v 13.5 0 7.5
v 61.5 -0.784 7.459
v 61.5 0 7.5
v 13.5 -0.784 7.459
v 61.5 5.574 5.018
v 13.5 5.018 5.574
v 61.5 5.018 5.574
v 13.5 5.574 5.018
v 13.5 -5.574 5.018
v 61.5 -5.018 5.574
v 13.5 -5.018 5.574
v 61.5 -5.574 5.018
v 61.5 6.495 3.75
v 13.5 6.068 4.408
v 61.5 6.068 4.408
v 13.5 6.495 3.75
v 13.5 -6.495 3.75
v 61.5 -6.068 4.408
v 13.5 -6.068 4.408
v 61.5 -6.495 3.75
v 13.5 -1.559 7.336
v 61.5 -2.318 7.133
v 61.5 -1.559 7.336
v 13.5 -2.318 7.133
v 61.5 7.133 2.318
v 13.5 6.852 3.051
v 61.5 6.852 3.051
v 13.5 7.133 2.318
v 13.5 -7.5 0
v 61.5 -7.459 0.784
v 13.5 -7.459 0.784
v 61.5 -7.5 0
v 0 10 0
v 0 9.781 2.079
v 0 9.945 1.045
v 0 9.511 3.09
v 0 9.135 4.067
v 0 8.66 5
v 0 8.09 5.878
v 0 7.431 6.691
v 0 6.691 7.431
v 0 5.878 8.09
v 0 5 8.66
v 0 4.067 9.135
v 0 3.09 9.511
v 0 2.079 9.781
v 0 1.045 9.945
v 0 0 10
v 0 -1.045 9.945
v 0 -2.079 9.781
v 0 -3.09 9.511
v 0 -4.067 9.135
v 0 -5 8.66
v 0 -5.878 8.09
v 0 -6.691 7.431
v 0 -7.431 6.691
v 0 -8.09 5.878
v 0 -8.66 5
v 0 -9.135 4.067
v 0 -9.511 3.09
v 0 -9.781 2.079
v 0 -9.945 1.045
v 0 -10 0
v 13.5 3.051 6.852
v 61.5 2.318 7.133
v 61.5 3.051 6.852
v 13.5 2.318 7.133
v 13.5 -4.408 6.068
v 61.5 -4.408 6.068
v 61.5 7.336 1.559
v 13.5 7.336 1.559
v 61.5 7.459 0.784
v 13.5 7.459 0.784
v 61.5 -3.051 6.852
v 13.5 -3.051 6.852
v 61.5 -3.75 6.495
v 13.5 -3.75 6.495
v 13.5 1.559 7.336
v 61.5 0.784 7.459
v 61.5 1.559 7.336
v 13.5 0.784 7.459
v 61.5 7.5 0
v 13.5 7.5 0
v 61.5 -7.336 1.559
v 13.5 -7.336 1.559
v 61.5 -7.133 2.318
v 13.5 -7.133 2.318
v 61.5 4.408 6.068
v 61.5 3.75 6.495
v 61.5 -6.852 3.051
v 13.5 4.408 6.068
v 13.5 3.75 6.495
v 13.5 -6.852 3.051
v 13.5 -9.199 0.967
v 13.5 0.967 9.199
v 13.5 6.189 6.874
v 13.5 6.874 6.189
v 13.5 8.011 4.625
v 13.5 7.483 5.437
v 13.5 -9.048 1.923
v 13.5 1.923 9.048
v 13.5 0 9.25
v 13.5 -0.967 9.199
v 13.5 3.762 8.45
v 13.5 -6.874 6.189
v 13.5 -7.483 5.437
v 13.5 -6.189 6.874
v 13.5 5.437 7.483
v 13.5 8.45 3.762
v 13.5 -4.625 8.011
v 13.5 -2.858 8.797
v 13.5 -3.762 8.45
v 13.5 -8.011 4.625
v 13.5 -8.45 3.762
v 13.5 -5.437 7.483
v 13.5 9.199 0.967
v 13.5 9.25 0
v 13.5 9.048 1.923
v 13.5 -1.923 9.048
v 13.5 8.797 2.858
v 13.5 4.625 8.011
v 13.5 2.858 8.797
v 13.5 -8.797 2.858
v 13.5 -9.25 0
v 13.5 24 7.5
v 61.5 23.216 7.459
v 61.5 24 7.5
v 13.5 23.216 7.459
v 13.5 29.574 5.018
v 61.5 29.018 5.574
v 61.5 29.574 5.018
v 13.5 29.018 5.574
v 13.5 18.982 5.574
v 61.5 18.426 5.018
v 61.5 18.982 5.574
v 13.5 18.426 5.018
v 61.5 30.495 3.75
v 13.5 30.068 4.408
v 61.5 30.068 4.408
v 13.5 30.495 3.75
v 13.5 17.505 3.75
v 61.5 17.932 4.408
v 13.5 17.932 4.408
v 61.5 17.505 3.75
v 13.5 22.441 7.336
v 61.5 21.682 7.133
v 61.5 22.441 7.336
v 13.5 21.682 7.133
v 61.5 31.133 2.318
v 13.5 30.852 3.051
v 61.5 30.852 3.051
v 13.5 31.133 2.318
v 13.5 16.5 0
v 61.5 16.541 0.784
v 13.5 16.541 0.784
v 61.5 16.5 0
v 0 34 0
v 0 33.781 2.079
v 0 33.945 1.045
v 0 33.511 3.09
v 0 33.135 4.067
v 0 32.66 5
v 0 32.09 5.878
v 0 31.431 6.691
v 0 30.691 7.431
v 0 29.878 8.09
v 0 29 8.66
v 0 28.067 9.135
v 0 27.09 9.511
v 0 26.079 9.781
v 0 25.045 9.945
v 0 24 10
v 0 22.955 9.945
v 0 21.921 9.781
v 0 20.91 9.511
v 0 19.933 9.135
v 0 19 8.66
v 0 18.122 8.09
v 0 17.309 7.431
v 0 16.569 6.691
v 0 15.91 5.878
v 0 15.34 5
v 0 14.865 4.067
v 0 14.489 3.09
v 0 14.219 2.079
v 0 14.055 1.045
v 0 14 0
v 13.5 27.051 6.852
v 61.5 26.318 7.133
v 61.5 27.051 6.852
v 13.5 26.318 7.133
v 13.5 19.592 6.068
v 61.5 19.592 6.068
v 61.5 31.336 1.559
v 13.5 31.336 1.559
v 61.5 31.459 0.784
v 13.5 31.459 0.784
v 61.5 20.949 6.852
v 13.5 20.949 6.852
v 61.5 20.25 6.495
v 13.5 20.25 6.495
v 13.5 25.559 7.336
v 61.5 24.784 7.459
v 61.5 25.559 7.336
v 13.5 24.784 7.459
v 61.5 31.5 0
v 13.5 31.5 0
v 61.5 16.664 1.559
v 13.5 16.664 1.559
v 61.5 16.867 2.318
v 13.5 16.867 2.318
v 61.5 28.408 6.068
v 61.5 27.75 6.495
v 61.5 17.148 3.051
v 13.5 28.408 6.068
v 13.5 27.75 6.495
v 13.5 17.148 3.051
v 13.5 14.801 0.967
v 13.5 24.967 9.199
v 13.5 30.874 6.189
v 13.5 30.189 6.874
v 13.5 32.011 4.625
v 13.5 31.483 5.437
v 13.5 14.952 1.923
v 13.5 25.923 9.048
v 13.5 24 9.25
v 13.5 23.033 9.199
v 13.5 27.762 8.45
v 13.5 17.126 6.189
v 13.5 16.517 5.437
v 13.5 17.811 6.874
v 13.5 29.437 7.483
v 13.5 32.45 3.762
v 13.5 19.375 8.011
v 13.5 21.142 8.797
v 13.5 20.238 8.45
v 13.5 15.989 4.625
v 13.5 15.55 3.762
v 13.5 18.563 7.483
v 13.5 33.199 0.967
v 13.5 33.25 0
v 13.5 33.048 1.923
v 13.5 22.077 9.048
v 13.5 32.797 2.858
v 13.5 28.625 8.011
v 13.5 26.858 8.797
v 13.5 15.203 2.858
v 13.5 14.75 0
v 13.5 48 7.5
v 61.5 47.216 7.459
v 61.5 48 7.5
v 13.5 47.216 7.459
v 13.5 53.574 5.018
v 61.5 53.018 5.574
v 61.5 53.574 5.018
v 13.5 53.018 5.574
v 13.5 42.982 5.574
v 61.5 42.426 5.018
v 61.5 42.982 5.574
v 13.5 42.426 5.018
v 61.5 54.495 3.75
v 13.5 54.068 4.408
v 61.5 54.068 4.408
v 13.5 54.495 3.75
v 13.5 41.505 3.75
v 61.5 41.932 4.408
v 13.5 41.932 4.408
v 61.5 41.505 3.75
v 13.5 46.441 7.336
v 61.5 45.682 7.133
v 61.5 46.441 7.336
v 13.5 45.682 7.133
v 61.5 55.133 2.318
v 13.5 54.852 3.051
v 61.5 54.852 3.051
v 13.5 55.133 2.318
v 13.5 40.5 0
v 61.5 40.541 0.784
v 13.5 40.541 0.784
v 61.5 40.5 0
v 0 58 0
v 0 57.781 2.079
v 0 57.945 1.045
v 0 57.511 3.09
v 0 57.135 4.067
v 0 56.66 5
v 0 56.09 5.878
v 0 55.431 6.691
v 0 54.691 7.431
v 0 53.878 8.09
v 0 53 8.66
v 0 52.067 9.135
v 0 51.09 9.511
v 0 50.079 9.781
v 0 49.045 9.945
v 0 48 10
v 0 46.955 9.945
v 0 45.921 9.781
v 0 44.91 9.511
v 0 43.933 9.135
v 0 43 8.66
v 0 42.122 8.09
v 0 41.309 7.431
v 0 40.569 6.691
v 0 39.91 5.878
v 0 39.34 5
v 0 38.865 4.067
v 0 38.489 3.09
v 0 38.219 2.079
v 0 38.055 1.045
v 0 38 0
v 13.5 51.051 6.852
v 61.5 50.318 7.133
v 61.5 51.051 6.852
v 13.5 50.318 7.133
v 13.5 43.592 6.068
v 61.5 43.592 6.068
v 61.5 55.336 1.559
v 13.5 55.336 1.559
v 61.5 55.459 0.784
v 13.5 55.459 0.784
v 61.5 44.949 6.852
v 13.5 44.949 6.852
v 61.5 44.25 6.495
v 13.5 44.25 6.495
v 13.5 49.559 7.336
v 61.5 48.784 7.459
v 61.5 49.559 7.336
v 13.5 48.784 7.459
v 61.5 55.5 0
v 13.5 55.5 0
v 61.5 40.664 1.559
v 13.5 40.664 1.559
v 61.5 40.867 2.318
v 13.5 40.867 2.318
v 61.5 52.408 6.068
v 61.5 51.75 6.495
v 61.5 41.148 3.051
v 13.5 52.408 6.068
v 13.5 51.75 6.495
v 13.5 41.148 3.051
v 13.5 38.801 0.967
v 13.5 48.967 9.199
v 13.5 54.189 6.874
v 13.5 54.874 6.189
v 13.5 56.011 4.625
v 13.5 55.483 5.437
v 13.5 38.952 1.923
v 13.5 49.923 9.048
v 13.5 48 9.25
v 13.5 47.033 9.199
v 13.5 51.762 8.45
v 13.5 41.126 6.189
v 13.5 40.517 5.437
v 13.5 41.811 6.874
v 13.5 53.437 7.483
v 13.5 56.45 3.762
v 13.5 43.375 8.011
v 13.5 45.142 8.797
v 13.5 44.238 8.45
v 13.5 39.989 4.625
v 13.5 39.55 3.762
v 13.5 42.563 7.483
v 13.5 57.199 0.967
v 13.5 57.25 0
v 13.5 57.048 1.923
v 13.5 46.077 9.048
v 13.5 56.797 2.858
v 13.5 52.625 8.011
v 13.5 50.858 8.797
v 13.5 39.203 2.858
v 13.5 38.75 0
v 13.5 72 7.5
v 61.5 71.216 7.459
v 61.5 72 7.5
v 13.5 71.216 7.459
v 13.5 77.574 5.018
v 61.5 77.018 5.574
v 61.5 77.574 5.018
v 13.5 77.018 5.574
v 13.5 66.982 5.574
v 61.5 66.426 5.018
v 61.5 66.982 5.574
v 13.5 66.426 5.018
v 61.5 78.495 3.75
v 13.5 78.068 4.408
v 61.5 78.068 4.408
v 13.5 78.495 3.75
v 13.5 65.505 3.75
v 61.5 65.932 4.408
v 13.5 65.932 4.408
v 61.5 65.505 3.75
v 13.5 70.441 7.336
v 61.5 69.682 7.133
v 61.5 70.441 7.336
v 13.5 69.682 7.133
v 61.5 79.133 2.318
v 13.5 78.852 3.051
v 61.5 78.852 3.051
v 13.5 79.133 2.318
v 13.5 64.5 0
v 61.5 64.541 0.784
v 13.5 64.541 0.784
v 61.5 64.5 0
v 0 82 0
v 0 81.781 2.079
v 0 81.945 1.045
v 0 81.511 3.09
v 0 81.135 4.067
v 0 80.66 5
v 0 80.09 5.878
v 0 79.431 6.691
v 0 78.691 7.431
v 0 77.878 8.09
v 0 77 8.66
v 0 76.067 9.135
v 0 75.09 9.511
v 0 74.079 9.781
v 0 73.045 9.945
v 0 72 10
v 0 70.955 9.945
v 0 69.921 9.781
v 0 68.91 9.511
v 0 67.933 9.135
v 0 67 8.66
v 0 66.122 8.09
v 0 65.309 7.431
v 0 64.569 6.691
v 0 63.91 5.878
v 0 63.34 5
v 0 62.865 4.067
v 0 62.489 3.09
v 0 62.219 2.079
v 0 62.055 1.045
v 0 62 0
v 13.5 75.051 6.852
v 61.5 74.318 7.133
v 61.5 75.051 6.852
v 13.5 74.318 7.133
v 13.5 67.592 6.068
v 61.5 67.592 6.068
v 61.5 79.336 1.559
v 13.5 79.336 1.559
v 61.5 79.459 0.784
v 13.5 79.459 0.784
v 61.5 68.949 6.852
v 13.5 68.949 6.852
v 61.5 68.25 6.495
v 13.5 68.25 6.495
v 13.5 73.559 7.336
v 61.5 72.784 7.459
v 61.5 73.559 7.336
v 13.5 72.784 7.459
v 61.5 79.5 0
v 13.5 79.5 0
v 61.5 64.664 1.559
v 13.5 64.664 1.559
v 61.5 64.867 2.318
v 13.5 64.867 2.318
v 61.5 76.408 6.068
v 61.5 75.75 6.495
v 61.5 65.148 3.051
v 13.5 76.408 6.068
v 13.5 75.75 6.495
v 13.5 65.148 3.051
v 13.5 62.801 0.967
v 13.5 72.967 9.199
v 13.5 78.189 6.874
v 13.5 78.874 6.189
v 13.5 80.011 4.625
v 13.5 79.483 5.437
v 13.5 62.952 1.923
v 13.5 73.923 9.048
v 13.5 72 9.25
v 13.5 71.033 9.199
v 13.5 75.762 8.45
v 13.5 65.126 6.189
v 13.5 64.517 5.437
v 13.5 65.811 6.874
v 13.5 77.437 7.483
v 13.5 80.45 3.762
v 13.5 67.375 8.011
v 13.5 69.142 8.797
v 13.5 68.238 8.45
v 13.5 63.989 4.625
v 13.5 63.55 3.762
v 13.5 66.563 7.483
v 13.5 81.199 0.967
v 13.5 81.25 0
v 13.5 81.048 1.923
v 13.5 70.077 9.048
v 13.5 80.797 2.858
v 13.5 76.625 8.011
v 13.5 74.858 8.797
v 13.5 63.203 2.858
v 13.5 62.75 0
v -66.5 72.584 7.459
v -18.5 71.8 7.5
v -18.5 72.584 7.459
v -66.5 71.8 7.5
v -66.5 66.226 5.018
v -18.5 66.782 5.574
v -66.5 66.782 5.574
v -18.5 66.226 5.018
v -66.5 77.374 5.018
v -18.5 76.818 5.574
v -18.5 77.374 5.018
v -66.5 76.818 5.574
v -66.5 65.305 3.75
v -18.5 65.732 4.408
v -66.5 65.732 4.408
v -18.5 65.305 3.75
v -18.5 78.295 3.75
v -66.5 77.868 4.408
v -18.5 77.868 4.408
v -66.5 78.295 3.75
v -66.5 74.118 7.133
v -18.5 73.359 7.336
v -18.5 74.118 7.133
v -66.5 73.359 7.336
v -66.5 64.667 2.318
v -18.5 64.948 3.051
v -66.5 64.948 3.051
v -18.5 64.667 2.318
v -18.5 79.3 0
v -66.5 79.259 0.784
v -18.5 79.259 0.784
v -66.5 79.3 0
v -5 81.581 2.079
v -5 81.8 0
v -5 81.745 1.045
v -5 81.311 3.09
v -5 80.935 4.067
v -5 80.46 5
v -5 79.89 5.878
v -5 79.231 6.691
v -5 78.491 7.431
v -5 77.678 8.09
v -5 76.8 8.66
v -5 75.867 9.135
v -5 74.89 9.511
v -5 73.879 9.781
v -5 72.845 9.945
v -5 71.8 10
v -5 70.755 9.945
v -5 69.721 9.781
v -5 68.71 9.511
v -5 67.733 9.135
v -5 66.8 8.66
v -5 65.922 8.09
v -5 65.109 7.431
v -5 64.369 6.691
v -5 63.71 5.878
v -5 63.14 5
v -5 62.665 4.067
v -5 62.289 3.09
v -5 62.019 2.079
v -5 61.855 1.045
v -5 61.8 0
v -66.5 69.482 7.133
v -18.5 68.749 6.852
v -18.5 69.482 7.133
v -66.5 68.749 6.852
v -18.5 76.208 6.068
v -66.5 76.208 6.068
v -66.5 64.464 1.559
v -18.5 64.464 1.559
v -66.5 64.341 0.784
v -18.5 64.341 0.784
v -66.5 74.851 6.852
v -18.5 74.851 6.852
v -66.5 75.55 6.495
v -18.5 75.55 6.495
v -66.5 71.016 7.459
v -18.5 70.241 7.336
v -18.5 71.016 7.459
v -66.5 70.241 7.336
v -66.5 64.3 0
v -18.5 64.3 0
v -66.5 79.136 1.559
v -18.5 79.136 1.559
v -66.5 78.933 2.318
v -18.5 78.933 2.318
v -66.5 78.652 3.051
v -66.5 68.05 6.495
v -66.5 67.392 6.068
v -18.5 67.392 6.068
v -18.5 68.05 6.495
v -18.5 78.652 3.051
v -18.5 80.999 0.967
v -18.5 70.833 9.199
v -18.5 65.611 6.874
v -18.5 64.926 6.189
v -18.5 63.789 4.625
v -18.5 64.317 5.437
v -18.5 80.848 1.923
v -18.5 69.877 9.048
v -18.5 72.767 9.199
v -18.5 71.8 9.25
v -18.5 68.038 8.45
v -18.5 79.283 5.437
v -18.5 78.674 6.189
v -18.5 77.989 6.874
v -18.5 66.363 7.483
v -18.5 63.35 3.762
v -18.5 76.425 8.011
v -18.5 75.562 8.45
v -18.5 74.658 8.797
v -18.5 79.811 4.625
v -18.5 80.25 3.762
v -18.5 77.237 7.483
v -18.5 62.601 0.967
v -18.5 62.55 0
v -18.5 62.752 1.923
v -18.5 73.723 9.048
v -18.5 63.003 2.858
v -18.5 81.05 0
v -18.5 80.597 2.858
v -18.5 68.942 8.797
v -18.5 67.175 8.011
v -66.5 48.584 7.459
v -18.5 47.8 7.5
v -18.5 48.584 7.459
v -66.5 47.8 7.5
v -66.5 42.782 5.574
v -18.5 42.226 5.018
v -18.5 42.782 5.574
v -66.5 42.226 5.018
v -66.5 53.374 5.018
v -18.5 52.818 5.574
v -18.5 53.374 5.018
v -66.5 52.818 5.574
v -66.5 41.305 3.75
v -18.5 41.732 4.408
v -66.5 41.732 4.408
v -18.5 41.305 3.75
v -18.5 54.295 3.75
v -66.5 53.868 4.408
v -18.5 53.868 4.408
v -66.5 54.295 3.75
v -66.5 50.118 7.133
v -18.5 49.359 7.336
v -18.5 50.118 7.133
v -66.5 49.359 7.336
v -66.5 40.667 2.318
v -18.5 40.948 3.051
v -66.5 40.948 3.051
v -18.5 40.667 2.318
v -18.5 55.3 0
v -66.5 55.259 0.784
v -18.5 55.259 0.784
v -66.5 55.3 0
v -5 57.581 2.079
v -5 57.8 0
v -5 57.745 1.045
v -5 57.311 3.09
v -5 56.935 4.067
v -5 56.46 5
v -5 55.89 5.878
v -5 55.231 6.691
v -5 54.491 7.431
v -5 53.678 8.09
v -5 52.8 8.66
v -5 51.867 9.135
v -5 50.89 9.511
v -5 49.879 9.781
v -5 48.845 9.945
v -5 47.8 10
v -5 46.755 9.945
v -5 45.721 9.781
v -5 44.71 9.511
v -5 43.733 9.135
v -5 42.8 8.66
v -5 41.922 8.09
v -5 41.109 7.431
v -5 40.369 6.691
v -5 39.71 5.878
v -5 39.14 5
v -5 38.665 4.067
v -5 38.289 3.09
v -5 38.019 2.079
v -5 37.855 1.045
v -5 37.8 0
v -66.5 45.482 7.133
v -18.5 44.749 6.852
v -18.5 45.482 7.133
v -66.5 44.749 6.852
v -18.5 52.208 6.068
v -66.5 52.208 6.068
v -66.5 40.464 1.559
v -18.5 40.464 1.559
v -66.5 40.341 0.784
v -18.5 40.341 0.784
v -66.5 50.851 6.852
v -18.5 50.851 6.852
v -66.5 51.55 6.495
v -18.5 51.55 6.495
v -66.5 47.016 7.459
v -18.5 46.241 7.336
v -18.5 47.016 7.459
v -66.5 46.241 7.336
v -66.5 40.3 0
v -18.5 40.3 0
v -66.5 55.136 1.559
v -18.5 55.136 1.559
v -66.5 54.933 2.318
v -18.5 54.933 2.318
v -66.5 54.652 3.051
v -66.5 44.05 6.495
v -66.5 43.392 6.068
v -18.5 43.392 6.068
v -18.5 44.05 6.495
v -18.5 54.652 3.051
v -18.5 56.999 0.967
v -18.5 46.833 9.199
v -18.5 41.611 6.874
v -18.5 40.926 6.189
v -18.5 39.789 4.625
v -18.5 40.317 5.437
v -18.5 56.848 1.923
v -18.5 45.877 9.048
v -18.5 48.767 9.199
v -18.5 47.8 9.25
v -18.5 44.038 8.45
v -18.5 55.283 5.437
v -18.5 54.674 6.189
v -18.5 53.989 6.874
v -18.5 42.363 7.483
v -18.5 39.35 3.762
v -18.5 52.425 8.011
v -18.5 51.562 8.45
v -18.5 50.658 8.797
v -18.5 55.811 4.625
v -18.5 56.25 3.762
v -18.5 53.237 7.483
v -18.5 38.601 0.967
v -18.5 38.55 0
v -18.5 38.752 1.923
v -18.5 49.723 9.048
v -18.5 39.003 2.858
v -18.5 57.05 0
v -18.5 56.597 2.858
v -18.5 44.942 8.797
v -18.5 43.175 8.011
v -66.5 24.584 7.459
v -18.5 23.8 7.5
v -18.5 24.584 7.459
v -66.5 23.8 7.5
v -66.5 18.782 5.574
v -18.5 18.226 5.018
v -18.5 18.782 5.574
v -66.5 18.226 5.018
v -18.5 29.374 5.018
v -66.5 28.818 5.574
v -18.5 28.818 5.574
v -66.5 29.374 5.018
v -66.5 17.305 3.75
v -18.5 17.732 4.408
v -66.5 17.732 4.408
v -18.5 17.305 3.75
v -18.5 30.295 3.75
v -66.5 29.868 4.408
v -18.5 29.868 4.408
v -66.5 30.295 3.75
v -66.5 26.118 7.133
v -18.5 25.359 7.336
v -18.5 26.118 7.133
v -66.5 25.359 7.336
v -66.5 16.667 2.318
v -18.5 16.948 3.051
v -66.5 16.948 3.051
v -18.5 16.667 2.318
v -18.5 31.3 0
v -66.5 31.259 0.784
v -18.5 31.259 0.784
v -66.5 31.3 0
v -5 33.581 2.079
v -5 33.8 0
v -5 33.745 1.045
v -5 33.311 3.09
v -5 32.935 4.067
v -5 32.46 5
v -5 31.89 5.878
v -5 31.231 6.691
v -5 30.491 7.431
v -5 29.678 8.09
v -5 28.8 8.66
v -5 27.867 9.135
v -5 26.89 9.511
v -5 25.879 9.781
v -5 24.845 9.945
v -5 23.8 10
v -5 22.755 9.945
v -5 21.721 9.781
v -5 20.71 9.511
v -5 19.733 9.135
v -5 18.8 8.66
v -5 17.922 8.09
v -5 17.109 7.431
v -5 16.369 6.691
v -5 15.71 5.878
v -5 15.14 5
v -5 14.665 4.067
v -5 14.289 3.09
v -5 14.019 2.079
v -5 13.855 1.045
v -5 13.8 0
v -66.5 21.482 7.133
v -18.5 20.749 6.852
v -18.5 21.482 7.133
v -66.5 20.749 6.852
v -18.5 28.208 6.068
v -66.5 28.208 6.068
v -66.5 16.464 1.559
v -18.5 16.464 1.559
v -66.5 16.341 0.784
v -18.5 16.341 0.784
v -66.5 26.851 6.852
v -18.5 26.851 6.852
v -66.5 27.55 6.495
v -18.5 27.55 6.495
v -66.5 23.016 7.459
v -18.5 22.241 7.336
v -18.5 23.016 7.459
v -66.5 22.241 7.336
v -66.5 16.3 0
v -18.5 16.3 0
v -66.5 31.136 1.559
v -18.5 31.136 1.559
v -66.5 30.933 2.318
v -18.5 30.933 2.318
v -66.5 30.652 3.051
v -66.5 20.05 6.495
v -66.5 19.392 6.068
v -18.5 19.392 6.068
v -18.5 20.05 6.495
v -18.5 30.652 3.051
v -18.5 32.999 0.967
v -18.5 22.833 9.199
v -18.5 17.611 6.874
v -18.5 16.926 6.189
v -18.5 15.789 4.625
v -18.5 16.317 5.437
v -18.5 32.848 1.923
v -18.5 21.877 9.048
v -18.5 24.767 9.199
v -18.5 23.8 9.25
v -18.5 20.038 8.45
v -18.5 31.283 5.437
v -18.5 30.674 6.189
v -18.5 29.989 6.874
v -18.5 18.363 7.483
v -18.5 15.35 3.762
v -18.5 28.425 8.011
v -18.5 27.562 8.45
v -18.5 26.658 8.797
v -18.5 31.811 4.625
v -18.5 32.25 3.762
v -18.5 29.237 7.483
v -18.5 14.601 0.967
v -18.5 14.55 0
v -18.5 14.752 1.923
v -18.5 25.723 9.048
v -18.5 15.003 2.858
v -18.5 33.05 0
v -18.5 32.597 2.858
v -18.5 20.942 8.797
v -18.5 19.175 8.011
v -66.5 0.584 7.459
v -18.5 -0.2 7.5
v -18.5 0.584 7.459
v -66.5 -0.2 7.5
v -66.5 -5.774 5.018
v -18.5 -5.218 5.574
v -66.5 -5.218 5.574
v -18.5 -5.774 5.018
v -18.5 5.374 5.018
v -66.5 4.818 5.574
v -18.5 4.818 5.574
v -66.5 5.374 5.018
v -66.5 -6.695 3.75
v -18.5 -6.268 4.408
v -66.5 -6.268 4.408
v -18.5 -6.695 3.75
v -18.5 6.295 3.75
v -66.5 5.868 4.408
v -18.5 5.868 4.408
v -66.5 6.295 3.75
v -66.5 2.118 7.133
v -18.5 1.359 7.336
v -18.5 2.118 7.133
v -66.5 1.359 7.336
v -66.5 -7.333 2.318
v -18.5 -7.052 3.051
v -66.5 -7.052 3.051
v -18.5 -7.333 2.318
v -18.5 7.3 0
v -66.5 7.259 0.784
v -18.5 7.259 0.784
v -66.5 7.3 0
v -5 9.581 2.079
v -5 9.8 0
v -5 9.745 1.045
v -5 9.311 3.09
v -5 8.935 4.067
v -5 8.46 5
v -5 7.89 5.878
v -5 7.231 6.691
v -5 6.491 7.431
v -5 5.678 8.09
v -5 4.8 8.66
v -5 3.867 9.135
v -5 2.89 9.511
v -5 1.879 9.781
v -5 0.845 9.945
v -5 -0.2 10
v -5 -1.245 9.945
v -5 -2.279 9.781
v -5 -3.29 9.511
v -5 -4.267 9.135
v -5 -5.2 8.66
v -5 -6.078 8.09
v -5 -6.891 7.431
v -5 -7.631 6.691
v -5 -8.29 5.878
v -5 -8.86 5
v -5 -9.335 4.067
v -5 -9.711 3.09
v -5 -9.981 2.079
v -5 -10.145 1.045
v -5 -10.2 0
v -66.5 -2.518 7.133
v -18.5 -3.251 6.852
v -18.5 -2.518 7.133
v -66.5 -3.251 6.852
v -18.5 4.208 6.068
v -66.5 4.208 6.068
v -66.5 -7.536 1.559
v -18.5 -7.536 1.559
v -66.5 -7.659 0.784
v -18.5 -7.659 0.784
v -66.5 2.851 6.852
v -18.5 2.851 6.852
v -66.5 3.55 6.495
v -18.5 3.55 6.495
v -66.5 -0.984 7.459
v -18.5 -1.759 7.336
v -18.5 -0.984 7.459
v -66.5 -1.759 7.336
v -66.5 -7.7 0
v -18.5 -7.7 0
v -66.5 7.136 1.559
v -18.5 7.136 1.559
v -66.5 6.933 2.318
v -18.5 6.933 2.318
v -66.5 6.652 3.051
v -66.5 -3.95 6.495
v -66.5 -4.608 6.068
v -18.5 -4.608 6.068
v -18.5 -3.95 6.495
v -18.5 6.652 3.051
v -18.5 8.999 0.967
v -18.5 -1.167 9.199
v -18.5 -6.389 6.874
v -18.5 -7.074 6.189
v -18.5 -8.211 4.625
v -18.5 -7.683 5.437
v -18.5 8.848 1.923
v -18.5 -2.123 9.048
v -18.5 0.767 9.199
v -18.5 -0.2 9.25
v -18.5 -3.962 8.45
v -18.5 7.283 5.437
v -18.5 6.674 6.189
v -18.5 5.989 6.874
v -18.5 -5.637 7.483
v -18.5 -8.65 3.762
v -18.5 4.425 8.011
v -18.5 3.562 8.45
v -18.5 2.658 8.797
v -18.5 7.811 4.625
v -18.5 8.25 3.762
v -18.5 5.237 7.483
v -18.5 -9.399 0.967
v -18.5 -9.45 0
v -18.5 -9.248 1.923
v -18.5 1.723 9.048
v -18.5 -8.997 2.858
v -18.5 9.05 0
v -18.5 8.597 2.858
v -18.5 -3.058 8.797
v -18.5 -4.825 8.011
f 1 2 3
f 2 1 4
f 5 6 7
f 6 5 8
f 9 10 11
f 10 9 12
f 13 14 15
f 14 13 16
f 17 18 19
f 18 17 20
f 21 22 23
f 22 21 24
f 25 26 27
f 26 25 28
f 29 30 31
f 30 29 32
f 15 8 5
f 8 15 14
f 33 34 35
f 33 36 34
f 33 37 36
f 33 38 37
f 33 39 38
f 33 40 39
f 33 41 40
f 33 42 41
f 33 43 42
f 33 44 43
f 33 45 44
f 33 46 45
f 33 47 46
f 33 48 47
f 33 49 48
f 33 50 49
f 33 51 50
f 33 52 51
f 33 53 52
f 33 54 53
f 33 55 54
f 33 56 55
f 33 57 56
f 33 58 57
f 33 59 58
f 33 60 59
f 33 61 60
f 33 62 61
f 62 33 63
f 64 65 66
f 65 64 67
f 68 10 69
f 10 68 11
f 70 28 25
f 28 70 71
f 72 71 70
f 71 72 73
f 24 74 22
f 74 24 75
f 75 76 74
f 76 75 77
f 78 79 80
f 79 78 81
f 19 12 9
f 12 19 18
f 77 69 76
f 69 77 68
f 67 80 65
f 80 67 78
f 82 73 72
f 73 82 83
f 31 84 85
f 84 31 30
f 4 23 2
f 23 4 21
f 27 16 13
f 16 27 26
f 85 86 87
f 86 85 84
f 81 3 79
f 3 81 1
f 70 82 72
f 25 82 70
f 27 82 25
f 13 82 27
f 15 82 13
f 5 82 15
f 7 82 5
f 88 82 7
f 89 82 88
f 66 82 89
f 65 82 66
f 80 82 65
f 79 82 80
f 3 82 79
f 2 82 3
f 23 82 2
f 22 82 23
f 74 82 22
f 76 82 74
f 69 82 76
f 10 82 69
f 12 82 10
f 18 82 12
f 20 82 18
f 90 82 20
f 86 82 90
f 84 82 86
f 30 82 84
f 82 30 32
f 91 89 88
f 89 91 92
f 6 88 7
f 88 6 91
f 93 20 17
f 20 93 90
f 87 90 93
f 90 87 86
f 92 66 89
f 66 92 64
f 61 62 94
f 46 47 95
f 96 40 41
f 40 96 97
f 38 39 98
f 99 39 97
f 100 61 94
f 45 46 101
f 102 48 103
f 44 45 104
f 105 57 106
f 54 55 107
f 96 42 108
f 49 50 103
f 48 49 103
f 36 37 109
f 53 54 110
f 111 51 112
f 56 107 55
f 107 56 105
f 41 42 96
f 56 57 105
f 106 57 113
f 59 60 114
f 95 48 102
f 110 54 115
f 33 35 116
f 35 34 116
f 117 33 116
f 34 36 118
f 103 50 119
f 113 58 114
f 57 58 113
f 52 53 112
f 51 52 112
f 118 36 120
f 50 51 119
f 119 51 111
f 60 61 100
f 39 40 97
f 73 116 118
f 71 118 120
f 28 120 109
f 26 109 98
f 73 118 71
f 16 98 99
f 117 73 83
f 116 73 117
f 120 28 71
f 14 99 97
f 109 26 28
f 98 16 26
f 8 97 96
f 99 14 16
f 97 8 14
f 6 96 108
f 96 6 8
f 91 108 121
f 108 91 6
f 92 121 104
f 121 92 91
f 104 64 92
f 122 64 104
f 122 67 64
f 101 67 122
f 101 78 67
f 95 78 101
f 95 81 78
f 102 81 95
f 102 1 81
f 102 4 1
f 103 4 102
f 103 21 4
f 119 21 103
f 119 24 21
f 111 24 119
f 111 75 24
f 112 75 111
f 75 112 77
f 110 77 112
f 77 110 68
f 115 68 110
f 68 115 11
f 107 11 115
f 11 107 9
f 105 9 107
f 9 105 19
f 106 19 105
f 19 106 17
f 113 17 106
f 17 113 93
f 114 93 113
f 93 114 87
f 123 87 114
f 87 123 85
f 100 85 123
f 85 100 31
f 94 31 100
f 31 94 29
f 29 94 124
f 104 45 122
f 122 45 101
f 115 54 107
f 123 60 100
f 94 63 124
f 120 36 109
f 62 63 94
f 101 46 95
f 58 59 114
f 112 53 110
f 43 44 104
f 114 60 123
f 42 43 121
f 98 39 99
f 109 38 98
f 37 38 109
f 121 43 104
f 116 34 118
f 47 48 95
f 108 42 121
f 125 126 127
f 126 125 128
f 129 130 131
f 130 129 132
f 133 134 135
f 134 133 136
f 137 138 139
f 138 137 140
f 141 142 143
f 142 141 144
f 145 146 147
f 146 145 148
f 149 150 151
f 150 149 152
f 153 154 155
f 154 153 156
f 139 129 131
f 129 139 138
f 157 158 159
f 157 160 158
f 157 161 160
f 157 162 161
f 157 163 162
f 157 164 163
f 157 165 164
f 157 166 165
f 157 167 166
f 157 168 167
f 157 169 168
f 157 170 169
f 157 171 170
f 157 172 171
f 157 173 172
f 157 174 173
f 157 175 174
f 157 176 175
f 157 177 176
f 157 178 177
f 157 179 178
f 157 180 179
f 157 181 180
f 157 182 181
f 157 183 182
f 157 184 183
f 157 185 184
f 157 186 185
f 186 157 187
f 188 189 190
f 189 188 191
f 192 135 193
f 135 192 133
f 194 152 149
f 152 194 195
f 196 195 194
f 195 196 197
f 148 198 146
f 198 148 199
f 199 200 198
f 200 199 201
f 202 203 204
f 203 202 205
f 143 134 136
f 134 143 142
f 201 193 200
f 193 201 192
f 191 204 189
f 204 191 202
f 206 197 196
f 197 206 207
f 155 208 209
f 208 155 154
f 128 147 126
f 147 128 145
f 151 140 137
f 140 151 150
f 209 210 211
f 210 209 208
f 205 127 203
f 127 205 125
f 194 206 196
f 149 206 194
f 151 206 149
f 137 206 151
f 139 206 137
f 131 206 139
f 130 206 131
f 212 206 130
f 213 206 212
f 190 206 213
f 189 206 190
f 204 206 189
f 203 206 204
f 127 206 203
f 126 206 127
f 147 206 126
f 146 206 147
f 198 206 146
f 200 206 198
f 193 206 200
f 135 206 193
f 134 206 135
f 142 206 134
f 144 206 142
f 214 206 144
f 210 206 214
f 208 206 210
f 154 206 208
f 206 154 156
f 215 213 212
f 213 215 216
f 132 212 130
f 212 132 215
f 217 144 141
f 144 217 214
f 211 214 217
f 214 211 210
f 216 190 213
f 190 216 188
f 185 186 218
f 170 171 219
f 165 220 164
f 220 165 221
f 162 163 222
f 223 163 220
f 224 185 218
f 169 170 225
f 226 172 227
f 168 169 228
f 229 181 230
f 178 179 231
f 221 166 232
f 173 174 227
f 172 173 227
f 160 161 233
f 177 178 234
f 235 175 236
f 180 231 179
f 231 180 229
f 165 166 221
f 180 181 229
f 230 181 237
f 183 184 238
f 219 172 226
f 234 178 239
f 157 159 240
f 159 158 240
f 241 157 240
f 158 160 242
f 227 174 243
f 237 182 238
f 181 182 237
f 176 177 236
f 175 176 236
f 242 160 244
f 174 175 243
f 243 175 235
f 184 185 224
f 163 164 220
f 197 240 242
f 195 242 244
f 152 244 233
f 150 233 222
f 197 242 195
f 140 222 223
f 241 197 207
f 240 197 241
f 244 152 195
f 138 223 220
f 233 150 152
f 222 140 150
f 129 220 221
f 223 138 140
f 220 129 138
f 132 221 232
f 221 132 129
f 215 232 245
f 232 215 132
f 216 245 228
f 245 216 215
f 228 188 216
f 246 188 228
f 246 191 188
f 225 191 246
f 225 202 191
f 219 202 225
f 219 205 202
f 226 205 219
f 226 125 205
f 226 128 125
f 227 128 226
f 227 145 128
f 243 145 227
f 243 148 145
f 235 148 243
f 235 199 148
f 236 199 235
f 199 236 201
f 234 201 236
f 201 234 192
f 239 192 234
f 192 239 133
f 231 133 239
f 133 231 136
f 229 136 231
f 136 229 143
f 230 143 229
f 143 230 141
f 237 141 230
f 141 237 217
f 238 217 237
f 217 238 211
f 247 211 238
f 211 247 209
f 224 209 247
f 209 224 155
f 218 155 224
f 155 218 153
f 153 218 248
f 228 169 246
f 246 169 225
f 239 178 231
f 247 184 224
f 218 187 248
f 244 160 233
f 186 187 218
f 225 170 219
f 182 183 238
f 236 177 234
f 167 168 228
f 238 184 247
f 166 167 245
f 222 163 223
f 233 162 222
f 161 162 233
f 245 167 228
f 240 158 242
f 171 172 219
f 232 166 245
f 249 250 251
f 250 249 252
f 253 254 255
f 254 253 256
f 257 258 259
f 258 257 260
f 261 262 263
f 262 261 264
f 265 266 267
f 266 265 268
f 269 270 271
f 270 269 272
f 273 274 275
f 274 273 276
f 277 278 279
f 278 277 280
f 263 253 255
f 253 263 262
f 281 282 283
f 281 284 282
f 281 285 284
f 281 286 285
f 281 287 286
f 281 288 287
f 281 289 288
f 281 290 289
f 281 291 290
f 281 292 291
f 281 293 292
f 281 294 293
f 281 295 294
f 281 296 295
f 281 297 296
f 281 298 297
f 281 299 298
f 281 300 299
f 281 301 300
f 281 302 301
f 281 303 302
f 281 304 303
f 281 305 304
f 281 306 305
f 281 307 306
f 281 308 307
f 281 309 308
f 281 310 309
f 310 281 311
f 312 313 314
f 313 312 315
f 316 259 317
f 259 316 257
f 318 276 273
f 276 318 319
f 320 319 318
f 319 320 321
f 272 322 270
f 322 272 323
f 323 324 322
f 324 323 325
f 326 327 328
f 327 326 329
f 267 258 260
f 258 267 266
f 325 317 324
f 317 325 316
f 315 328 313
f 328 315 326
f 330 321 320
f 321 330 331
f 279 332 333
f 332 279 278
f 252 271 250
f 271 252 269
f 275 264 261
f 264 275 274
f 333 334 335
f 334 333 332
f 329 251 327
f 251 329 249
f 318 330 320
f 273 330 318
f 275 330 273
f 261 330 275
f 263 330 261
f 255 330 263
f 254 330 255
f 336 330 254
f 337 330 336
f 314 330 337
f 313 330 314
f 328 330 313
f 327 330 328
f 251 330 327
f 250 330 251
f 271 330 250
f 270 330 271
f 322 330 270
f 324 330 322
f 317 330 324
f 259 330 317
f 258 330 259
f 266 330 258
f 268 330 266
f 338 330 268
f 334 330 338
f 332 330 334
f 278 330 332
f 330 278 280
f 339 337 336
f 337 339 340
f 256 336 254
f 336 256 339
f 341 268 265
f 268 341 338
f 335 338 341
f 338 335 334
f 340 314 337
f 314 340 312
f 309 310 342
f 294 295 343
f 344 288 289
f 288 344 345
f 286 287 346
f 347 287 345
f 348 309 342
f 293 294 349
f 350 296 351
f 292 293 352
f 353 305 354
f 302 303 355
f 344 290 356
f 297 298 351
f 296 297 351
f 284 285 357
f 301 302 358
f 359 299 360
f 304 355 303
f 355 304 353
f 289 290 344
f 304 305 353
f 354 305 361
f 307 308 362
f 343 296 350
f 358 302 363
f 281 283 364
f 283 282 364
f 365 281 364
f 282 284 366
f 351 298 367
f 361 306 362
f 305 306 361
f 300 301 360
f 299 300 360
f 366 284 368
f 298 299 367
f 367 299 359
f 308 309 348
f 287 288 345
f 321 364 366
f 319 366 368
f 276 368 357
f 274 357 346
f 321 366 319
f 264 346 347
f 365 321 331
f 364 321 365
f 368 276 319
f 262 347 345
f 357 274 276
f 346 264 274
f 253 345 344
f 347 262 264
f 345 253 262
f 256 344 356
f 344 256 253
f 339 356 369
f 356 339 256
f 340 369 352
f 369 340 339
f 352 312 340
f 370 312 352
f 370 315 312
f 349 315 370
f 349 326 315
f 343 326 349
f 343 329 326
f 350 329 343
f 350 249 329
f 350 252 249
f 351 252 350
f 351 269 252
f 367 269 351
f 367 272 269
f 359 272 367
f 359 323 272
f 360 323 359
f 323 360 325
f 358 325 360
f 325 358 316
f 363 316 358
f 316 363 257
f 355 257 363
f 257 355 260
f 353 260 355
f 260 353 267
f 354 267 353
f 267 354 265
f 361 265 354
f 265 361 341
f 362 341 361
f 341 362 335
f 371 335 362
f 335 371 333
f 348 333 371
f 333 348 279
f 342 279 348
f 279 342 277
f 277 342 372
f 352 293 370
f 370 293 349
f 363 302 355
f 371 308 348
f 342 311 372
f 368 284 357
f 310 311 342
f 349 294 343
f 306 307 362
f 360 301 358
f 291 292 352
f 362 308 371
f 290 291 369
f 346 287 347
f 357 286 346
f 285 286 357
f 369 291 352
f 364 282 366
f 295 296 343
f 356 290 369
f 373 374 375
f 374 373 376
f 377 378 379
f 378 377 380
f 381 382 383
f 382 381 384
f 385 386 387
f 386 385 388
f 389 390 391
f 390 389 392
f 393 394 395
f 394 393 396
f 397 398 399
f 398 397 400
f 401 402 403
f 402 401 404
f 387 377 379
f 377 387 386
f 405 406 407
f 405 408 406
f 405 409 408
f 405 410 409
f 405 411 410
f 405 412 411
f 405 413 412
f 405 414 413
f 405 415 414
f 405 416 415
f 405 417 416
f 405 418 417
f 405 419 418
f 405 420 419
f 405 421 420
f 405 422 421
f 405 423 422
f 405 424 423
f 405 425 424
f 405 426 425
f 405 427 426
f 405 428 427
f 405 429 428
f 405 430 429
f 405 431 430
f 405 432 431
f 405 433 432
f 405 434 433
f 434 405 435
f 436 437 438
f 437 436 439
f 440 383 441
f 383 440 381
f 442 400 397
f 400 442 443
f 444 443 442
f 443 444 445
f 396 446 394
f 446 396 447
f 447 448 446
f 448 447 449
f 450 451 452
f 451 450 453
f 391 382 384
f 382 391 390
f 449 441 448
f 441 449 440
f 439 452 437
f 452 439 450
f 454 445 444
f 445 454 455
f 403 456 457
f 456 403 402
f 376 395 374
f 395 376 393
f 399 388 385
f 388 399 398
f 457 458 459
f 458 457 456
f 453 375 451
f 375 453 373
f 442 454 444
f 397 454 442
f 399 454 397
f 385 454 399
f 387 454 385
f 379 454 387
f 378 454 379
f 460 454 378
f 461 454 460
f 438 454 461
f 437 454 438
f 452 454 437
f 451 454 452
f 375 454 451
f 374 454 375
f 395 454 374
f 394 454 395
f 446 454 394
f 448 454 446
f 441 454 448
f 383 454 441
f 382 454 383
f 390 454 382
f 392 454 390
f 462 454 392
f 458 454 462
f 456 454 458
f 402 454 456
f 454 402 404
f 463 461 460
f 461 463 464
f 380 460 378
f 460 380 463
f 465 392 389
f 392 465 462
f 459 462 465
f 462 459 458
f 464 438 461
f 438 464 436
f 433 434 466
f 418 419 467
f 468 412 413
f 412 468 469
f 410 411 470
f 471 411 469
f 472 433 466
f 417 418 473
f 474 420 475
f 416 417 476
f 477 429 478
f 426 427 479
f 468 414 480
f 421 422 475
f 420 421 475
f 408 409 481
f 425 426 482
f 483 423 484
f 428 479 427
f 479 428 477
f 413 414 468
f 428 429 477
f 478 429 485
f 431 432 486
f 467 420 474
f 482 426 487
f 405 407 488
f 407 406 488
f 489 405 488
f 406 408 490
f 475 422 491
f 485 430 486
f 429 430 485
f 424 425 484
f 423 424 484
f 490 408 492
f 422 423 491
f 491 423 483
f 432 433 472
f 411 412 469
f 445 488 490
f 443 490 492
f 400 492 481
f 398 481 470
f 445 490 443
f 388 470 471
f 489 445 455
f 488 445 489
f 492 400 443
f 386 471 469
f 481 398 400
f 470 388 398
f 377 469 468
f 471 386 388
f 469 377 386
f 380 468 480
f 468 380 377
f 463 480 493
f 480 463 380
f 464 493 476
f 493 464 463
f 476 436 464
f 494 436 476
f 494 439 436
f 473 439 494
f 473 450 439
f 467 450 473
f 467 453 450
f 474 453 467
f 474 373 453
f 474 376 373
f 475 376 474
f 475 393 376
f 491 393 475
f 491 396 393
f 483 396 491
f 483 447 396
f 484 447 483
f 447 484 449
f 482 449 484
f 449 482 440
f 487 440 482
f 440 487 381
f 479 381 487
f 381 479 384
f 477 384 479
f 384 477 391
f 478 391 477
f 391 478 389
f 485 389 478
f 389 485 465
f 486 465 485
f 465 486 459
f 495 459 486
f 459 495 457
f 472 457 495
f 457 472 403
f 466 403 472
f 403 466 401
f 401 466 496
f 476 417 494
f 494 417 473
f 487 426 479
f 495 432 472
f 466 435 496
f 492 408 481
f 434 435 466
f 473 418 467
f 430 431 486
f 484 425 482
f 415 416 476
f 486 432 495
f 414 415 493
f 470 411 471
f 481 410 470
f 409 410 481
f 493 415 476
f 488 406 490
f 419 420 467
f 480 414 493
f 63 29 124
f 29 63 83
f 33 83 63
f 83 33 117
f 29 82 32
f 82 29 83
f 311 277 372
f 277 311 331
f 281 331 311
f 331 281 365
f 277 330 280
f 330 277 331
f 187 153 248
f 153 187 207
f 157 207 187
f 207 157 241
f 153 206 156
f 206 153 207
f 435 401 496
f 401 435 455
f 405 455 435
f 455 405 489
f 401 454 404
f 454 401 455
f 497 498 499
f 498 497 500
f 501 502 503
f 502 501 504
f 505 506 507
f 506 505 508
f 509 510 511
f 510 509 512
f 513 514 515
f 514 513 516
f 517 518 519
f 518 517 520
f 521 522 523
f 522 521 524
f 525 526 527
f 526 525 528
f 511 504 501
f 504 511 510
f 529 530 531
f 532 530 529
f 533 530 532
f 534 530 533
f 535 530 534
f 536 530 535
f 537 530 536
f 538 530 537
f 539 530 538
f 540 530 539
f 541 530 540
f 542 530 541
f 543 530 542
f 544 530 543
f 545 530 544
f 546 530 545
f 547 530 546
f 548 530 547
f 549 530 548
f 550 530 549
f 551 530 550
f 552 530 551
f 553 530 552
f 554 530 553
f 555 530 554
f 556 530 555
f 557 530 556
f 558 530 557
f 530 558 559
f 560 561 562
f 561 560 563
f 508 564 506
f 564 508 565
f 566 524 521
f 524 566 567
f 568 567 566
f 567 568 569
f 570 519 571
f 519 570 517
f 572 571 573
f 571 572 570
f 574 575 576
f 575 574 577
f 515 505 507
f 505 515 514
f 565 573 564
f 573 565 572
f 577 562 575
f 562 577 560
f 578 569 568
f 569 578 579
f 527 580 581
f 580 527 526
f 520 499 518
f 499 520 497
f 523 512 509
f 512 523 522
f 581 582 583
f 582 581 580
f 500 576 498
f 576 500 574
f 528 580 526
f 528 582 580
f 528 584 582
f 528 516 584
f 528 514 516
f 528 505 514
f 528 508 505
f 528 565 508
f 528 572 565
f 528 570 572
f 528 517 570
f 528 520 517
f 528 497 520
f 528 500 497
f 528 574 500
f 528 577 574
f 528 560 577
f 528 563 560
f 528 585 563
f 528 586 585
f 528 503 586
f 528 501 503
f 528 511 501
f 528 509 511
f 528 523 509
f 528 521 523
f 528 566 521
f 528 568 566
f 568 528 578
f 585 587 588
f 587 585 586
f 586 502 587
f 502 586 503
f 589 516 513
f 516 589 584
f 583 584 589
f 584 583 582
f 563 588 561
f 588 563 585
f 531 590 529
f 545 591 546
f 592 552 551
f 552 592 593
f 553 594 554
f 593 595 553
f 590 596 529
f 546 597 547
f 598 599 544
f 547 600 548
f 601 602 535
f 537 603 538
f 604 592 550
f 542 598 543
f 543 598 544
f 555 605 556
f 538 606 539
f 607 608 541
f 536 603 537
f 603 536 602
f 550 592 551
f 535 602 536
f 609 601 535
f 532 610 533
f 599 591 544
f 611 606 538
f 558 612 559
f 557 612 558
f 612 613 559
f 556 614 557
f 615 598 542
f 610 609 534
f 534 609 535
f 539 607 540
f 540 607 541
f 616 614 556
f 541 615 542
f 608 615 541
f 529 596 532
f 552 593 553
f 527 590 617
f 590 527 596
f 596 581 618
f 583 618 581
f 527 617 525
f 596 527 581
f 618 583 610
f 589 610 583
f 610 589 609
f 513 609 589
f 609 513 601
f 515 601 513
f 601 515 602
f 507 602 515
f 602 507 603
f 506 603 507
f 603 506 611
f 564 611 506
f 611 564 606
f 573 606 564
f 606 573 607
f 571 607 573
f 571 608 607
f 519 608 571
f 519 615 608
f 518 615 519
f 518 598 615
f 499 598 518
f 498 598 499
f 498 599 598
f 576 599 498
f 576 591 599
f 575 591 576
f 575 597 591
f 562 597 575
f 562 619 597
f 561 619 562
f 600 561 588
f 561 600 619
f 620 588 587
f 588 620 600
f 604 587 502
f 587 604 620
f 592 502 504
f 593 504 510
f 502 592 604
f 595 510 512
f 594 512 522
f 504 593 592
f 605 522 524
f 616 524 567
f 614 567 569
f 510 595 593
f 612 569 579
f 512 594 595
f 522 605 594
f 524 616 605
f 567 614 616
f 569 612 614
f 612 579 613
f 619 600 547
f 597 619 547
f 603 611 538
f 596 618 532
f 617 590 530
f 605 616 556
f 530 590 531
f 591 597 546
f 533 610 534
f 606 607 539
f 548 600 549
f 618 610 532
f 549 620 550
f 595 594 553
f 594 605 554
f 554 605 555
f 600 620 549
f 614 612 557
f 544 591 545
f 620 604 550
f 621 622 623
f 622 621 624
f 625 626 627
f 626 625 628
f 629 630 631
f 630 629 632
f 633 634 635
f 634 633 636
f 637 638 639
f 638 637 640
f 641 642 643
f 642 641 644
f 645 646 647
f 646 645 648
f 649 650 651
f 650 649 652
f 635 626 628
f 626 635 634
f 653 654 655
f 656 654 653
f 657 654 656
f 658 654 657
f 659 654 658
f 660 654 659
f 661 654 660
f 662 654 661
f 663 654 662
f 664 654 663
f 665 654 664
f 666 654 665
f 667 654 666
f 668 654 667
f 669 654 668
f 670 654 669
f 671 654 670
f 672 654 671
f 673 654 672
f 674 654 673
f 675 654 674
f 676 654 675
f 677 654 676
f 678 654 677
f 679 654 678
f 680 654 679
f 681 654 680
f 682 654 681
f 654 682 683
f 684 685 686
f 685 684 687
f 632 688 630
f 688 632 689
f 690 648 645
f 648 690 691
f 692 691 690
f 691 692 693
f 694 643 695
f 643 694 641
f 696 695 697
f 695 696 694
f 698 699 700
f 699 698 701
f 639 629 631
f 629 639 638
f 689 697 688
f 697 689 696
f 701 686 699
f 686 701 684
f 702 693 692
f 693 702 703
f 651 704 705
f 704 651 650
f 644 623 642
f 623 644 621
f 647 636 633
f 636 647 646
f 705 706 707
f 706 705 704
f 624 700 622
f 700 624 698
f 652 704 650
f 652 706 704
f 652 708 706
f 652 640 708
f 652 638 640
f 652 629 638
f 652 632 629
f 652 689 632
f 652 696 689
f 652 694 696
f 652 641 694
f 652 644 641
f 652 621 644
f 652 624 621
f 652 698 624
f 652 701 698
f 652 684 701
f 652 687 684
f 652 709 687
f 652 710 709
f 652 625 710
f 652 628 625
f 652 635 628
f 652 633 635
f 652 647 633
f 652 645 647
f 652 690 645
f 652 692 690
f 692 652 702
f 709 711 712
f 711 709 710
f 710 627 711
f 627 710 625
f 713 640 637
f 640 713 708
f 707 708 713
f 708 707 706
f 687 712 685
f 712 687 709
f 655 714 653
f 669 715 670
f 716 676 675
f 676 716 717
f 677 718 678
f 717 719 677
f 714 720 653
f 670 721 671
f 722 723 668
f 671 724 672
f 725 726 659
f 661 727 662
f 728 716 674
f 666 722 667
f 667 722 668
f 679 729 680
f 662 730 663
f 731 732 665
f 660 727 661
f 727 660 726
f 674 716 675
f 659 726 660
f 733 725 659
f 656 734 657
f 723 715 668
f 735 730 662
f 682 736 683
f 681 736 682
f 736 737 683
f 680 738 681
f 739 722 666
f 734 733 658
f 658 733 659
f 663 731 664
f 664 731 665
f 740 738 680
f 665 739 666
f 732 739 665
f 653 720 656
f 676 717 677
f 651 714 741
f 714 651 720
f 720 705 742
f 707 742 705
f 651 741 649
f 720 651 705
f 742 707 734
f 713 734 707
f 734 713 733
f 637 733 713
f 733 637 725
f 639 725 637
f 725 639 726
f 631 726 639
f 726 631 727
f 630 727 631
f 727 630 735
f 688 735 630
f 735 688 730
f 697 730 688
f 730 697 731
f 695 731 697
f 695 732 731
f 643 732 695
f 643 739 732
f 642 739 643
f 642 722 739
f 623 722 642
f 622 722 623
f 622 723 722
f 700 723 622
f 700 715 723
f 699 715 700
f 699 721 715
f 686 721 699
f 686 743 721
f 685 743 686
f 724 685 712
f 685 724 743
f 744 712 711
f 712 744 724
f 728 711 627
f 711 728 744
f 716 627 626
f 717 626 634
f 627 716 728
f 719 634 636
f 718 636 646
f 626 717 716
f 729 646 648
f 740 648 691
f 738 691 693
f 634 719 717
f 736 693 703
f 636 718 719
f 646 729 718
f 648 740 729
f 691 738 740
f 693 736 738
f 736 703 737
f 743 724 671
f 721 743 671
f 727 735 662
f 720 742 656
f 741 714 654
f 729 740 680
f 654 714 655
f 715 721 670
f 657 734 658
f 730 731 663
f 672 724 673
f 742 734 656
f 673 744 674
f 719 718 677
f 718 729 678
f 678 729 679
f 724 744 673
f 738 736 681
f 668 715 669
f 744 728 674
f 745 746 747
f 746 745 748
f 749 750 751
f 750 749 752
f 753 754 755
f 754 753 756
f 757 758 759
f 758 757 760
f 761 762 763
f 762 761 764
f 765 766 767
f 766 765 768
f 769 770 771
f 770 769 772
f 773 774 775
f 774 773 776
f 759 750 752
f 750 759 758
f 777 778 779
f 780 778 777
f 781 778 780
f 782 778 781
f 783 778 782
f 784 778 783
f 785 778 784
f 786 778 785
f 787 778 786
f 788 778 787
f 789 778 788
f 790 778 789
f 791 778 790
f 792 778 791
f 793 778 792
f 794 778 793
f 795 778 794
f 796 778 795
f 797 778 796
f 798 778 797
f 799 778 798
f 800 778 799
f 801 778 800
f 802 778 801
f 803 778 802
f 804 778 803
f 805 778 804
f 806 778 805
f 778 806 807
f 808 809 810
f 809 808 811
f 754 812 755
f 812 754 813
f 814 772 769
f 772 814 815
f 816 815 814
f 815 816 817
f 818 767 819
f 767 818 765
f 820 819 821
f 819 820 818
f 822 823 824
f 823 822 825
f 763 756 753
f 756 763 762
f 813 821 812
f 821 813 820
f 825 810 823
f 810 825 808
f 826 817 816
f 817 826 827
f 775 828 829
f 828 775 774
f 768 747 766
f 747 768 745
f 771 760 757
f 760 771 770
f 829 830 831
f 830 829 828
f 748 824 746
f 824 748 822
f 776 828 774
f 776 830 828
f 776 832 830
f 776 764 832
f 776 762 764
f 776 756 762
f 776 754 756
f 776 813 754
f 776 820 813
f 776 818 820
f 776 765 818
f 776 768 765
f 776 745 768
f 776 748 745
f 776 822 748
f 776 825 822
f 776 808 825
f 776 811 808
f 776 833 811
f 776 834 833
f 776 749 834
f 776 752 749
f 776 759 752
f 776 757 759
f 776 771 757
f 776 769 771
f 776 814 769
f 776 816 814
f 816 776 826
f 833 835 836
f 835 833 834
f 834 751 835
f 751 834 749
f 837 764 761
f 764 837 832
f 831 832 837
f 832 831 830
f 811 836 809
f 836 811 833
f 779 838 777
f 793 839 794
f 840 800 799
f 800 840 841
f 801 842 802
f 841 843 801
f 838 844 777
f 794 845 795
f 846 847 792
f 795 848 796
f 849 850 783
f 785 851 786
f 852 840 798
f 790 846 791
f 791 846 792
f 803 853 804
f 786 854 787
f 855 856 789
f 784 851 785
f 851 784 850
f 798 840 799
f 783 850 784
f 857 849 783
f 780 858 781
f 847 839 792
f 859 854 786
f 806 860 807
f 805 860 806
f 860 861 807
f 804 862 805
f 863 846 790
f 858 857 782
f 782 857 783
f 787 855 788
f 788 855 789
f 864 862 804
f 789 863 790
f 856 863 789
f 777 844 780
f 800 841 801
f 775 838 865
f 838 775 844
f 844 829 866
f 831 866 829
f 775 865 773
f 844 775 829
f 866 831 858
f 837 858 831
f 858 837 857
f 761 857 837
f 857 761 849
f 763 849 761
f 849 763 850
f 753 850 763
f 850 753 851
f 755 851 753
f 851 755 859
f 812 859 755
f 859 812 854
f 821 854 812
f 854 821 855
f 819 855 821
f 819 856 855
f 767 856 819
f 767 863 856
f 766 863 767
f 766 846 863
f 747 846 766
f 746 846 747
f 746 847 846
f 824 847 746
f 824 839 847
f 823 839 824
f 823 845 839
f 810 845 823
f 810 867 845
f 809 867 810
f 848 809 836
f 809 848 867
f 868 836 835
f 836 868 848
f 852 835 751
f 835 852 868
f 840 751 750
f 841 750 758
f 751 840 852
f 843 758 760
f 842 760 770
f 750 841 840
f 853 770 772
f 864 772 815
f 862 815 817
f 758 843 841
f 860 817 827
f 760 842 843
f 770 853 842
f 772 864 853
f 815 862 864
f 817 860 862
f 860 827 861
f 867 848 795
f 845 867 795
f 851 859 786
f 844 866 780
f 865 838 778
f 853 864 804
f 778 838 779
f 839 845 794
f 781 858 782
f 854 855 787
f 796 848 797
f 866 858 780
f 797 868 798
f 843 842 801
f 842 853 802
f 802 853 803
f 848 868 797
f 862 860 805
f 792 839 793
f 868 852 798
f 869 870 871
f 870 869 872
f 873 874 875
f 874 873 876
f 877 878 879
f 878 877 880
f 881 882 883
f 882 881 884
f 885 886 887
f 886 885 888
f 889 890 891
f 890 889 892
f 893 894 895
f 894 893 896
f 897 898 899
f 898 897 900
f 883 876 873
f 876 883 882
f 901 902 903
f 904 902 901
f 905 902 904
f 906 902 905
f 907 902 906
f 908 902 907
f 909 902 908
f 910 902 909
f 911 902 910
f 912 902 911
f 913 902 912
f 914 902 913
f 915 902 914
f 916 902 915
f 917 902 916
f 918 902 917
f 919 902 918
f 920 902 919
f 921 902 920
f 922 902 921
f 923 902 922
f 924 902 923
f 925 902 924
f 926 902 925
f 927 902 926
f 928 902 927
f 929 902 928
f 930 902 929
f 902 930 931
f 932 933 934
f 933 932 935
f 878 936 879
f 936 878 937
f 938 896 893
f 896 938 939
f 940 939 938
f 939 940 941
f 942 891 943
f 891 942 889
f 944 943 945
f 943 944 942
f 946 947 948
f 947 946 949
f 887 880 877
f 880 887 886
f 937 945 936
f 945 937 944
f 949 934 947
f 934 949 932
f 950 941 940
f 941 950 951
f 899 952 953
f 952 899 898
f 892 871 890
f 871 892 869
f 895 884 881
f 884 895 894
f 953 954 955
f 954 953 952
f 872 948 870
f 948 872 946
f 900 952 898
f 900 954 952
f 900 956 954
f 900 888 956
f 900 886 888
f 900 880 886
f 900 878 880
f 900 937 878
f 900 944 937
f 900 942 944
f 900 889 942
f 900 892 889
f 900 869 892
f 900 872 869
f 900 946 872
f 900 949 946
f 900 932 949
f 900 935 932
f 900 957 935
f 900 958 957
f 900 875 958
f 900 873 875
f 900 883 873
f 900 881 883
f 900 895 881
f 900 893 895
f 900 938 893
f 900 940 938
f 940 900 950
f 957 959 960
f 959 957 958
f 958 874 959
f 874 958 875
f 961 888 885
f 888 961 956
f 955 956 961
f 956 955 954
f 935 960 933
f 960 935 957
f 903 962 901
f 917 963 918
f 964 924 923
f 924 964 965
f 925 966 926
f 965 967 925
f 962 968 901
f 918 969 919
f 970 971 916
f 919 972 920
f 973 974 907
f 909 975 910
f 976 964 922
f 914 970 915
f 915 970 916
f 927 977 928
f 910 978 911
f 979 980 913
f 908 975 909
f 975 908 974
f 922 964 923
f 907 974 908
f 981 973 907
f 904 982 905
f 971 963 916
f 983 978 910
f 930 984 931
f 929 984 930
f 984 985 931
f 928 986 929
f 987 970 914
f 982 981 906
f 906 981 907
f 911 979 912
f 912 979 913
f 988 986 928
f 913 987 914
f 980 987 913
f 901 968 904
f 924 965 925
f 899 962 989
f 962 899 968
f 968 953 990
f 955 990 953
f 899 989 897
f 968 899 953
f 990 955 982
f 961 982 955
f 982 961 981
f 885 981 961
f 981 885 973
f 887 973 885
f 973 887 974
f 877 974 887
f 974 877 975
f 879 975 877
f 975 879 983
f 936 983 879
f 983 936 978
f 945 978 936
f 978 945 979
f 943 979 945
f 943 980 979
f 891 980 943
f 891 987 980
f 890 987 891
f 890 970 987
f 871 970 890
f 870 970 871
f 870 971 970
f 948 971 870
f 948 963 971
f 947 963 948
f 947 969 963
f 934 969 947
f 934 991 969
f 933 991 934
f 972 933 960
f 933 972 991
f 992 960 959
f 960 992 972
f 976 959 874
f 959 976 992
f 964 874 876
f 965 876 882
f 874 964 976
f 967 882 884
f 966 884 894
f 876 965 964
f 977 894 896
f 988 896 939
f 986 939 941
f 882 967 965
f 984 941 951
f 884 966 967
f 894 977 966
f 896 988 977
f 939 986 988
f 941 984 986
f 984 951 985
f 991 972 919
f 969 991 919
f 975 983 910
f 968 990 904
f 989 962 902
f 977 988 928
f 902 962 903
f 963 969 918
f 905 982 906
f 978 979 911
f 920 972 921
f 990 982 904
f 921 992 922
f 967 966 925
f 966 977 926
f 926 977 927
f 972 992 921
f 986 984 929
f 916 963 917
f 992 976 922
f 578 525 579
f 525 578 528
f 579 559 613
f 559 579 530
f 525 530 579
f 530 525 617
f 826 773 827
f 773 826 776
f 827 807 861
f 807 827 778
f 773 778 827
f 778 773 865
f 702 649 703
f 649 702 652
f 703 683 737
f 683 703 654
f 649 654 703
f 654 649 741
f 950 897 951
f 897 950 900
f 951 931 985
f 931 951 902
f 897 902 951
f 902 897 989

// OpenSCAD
d1=13;
d2=16.5;
d3=18;
h1=48;
h2=13.5;

module cp (d1=d1, d2=d2, d3=d3, h1=h1, h2=h2)
{
    cylinder (h=h1+h2, r=d1/2);
    cylinder (h=h2, r2=d2/2, r1=d3/2);
}


module fourhalves (d1=d1, d2=d2, d3=d3, h1=h1, h2=h2)
{
    difference () {
        union () {
            translate ([0, 0, 0]) rotate ([0, 90, 0])
                cp (d1=d1, d2=d2, d3=d3, h1=h1, h2=h2);

            translate ([0, 1.2*d3, 0]) rotate ([0, 90, 0])
                cp (d1=d1, d2=d2, d3=d3, h1=h1, h2=h2);

            translate ([0, 2.4*d3, 0]) rotate ([0, 90, 0])
                cp (d1=d1, d2=d2, d3=d3, h1=h1, h2=h2);

            translate ([0, 3.6*d3, 0]) rotate ([0, 90, 0])
                cp (d1=d1, d2=d2, d3=d3, h1=h1, h2=h2);
        }
        translate ([-h1-h2, -d3, -d3])
            cube ([3*(h1+h2), 3*4*d3, d3]);
    }
}

//fourhalves ($fa = 6, $fs = .5);

// bigger variant
// fourhalves (d1=14, d2=17.5, d3=19, $fa = 6, $fs = .5);
//translate ([-5, 68, 0])
//    rotate([0, 0, 180])
//        fourhalves (d1=14, d2=17.5, d3=19, $fa = 6, $fs = .5);

// Even bigger variant
fourhalves (d1=15, d2=18.5, d3=20, $fa = 6, $fs = .5);
translate ([-5, 71.8, 0])
    rotate([0, 0, 180])
        fourhalves (d1=15, d2=18.5, d3=20, $fa = 6, $fs = .5);
